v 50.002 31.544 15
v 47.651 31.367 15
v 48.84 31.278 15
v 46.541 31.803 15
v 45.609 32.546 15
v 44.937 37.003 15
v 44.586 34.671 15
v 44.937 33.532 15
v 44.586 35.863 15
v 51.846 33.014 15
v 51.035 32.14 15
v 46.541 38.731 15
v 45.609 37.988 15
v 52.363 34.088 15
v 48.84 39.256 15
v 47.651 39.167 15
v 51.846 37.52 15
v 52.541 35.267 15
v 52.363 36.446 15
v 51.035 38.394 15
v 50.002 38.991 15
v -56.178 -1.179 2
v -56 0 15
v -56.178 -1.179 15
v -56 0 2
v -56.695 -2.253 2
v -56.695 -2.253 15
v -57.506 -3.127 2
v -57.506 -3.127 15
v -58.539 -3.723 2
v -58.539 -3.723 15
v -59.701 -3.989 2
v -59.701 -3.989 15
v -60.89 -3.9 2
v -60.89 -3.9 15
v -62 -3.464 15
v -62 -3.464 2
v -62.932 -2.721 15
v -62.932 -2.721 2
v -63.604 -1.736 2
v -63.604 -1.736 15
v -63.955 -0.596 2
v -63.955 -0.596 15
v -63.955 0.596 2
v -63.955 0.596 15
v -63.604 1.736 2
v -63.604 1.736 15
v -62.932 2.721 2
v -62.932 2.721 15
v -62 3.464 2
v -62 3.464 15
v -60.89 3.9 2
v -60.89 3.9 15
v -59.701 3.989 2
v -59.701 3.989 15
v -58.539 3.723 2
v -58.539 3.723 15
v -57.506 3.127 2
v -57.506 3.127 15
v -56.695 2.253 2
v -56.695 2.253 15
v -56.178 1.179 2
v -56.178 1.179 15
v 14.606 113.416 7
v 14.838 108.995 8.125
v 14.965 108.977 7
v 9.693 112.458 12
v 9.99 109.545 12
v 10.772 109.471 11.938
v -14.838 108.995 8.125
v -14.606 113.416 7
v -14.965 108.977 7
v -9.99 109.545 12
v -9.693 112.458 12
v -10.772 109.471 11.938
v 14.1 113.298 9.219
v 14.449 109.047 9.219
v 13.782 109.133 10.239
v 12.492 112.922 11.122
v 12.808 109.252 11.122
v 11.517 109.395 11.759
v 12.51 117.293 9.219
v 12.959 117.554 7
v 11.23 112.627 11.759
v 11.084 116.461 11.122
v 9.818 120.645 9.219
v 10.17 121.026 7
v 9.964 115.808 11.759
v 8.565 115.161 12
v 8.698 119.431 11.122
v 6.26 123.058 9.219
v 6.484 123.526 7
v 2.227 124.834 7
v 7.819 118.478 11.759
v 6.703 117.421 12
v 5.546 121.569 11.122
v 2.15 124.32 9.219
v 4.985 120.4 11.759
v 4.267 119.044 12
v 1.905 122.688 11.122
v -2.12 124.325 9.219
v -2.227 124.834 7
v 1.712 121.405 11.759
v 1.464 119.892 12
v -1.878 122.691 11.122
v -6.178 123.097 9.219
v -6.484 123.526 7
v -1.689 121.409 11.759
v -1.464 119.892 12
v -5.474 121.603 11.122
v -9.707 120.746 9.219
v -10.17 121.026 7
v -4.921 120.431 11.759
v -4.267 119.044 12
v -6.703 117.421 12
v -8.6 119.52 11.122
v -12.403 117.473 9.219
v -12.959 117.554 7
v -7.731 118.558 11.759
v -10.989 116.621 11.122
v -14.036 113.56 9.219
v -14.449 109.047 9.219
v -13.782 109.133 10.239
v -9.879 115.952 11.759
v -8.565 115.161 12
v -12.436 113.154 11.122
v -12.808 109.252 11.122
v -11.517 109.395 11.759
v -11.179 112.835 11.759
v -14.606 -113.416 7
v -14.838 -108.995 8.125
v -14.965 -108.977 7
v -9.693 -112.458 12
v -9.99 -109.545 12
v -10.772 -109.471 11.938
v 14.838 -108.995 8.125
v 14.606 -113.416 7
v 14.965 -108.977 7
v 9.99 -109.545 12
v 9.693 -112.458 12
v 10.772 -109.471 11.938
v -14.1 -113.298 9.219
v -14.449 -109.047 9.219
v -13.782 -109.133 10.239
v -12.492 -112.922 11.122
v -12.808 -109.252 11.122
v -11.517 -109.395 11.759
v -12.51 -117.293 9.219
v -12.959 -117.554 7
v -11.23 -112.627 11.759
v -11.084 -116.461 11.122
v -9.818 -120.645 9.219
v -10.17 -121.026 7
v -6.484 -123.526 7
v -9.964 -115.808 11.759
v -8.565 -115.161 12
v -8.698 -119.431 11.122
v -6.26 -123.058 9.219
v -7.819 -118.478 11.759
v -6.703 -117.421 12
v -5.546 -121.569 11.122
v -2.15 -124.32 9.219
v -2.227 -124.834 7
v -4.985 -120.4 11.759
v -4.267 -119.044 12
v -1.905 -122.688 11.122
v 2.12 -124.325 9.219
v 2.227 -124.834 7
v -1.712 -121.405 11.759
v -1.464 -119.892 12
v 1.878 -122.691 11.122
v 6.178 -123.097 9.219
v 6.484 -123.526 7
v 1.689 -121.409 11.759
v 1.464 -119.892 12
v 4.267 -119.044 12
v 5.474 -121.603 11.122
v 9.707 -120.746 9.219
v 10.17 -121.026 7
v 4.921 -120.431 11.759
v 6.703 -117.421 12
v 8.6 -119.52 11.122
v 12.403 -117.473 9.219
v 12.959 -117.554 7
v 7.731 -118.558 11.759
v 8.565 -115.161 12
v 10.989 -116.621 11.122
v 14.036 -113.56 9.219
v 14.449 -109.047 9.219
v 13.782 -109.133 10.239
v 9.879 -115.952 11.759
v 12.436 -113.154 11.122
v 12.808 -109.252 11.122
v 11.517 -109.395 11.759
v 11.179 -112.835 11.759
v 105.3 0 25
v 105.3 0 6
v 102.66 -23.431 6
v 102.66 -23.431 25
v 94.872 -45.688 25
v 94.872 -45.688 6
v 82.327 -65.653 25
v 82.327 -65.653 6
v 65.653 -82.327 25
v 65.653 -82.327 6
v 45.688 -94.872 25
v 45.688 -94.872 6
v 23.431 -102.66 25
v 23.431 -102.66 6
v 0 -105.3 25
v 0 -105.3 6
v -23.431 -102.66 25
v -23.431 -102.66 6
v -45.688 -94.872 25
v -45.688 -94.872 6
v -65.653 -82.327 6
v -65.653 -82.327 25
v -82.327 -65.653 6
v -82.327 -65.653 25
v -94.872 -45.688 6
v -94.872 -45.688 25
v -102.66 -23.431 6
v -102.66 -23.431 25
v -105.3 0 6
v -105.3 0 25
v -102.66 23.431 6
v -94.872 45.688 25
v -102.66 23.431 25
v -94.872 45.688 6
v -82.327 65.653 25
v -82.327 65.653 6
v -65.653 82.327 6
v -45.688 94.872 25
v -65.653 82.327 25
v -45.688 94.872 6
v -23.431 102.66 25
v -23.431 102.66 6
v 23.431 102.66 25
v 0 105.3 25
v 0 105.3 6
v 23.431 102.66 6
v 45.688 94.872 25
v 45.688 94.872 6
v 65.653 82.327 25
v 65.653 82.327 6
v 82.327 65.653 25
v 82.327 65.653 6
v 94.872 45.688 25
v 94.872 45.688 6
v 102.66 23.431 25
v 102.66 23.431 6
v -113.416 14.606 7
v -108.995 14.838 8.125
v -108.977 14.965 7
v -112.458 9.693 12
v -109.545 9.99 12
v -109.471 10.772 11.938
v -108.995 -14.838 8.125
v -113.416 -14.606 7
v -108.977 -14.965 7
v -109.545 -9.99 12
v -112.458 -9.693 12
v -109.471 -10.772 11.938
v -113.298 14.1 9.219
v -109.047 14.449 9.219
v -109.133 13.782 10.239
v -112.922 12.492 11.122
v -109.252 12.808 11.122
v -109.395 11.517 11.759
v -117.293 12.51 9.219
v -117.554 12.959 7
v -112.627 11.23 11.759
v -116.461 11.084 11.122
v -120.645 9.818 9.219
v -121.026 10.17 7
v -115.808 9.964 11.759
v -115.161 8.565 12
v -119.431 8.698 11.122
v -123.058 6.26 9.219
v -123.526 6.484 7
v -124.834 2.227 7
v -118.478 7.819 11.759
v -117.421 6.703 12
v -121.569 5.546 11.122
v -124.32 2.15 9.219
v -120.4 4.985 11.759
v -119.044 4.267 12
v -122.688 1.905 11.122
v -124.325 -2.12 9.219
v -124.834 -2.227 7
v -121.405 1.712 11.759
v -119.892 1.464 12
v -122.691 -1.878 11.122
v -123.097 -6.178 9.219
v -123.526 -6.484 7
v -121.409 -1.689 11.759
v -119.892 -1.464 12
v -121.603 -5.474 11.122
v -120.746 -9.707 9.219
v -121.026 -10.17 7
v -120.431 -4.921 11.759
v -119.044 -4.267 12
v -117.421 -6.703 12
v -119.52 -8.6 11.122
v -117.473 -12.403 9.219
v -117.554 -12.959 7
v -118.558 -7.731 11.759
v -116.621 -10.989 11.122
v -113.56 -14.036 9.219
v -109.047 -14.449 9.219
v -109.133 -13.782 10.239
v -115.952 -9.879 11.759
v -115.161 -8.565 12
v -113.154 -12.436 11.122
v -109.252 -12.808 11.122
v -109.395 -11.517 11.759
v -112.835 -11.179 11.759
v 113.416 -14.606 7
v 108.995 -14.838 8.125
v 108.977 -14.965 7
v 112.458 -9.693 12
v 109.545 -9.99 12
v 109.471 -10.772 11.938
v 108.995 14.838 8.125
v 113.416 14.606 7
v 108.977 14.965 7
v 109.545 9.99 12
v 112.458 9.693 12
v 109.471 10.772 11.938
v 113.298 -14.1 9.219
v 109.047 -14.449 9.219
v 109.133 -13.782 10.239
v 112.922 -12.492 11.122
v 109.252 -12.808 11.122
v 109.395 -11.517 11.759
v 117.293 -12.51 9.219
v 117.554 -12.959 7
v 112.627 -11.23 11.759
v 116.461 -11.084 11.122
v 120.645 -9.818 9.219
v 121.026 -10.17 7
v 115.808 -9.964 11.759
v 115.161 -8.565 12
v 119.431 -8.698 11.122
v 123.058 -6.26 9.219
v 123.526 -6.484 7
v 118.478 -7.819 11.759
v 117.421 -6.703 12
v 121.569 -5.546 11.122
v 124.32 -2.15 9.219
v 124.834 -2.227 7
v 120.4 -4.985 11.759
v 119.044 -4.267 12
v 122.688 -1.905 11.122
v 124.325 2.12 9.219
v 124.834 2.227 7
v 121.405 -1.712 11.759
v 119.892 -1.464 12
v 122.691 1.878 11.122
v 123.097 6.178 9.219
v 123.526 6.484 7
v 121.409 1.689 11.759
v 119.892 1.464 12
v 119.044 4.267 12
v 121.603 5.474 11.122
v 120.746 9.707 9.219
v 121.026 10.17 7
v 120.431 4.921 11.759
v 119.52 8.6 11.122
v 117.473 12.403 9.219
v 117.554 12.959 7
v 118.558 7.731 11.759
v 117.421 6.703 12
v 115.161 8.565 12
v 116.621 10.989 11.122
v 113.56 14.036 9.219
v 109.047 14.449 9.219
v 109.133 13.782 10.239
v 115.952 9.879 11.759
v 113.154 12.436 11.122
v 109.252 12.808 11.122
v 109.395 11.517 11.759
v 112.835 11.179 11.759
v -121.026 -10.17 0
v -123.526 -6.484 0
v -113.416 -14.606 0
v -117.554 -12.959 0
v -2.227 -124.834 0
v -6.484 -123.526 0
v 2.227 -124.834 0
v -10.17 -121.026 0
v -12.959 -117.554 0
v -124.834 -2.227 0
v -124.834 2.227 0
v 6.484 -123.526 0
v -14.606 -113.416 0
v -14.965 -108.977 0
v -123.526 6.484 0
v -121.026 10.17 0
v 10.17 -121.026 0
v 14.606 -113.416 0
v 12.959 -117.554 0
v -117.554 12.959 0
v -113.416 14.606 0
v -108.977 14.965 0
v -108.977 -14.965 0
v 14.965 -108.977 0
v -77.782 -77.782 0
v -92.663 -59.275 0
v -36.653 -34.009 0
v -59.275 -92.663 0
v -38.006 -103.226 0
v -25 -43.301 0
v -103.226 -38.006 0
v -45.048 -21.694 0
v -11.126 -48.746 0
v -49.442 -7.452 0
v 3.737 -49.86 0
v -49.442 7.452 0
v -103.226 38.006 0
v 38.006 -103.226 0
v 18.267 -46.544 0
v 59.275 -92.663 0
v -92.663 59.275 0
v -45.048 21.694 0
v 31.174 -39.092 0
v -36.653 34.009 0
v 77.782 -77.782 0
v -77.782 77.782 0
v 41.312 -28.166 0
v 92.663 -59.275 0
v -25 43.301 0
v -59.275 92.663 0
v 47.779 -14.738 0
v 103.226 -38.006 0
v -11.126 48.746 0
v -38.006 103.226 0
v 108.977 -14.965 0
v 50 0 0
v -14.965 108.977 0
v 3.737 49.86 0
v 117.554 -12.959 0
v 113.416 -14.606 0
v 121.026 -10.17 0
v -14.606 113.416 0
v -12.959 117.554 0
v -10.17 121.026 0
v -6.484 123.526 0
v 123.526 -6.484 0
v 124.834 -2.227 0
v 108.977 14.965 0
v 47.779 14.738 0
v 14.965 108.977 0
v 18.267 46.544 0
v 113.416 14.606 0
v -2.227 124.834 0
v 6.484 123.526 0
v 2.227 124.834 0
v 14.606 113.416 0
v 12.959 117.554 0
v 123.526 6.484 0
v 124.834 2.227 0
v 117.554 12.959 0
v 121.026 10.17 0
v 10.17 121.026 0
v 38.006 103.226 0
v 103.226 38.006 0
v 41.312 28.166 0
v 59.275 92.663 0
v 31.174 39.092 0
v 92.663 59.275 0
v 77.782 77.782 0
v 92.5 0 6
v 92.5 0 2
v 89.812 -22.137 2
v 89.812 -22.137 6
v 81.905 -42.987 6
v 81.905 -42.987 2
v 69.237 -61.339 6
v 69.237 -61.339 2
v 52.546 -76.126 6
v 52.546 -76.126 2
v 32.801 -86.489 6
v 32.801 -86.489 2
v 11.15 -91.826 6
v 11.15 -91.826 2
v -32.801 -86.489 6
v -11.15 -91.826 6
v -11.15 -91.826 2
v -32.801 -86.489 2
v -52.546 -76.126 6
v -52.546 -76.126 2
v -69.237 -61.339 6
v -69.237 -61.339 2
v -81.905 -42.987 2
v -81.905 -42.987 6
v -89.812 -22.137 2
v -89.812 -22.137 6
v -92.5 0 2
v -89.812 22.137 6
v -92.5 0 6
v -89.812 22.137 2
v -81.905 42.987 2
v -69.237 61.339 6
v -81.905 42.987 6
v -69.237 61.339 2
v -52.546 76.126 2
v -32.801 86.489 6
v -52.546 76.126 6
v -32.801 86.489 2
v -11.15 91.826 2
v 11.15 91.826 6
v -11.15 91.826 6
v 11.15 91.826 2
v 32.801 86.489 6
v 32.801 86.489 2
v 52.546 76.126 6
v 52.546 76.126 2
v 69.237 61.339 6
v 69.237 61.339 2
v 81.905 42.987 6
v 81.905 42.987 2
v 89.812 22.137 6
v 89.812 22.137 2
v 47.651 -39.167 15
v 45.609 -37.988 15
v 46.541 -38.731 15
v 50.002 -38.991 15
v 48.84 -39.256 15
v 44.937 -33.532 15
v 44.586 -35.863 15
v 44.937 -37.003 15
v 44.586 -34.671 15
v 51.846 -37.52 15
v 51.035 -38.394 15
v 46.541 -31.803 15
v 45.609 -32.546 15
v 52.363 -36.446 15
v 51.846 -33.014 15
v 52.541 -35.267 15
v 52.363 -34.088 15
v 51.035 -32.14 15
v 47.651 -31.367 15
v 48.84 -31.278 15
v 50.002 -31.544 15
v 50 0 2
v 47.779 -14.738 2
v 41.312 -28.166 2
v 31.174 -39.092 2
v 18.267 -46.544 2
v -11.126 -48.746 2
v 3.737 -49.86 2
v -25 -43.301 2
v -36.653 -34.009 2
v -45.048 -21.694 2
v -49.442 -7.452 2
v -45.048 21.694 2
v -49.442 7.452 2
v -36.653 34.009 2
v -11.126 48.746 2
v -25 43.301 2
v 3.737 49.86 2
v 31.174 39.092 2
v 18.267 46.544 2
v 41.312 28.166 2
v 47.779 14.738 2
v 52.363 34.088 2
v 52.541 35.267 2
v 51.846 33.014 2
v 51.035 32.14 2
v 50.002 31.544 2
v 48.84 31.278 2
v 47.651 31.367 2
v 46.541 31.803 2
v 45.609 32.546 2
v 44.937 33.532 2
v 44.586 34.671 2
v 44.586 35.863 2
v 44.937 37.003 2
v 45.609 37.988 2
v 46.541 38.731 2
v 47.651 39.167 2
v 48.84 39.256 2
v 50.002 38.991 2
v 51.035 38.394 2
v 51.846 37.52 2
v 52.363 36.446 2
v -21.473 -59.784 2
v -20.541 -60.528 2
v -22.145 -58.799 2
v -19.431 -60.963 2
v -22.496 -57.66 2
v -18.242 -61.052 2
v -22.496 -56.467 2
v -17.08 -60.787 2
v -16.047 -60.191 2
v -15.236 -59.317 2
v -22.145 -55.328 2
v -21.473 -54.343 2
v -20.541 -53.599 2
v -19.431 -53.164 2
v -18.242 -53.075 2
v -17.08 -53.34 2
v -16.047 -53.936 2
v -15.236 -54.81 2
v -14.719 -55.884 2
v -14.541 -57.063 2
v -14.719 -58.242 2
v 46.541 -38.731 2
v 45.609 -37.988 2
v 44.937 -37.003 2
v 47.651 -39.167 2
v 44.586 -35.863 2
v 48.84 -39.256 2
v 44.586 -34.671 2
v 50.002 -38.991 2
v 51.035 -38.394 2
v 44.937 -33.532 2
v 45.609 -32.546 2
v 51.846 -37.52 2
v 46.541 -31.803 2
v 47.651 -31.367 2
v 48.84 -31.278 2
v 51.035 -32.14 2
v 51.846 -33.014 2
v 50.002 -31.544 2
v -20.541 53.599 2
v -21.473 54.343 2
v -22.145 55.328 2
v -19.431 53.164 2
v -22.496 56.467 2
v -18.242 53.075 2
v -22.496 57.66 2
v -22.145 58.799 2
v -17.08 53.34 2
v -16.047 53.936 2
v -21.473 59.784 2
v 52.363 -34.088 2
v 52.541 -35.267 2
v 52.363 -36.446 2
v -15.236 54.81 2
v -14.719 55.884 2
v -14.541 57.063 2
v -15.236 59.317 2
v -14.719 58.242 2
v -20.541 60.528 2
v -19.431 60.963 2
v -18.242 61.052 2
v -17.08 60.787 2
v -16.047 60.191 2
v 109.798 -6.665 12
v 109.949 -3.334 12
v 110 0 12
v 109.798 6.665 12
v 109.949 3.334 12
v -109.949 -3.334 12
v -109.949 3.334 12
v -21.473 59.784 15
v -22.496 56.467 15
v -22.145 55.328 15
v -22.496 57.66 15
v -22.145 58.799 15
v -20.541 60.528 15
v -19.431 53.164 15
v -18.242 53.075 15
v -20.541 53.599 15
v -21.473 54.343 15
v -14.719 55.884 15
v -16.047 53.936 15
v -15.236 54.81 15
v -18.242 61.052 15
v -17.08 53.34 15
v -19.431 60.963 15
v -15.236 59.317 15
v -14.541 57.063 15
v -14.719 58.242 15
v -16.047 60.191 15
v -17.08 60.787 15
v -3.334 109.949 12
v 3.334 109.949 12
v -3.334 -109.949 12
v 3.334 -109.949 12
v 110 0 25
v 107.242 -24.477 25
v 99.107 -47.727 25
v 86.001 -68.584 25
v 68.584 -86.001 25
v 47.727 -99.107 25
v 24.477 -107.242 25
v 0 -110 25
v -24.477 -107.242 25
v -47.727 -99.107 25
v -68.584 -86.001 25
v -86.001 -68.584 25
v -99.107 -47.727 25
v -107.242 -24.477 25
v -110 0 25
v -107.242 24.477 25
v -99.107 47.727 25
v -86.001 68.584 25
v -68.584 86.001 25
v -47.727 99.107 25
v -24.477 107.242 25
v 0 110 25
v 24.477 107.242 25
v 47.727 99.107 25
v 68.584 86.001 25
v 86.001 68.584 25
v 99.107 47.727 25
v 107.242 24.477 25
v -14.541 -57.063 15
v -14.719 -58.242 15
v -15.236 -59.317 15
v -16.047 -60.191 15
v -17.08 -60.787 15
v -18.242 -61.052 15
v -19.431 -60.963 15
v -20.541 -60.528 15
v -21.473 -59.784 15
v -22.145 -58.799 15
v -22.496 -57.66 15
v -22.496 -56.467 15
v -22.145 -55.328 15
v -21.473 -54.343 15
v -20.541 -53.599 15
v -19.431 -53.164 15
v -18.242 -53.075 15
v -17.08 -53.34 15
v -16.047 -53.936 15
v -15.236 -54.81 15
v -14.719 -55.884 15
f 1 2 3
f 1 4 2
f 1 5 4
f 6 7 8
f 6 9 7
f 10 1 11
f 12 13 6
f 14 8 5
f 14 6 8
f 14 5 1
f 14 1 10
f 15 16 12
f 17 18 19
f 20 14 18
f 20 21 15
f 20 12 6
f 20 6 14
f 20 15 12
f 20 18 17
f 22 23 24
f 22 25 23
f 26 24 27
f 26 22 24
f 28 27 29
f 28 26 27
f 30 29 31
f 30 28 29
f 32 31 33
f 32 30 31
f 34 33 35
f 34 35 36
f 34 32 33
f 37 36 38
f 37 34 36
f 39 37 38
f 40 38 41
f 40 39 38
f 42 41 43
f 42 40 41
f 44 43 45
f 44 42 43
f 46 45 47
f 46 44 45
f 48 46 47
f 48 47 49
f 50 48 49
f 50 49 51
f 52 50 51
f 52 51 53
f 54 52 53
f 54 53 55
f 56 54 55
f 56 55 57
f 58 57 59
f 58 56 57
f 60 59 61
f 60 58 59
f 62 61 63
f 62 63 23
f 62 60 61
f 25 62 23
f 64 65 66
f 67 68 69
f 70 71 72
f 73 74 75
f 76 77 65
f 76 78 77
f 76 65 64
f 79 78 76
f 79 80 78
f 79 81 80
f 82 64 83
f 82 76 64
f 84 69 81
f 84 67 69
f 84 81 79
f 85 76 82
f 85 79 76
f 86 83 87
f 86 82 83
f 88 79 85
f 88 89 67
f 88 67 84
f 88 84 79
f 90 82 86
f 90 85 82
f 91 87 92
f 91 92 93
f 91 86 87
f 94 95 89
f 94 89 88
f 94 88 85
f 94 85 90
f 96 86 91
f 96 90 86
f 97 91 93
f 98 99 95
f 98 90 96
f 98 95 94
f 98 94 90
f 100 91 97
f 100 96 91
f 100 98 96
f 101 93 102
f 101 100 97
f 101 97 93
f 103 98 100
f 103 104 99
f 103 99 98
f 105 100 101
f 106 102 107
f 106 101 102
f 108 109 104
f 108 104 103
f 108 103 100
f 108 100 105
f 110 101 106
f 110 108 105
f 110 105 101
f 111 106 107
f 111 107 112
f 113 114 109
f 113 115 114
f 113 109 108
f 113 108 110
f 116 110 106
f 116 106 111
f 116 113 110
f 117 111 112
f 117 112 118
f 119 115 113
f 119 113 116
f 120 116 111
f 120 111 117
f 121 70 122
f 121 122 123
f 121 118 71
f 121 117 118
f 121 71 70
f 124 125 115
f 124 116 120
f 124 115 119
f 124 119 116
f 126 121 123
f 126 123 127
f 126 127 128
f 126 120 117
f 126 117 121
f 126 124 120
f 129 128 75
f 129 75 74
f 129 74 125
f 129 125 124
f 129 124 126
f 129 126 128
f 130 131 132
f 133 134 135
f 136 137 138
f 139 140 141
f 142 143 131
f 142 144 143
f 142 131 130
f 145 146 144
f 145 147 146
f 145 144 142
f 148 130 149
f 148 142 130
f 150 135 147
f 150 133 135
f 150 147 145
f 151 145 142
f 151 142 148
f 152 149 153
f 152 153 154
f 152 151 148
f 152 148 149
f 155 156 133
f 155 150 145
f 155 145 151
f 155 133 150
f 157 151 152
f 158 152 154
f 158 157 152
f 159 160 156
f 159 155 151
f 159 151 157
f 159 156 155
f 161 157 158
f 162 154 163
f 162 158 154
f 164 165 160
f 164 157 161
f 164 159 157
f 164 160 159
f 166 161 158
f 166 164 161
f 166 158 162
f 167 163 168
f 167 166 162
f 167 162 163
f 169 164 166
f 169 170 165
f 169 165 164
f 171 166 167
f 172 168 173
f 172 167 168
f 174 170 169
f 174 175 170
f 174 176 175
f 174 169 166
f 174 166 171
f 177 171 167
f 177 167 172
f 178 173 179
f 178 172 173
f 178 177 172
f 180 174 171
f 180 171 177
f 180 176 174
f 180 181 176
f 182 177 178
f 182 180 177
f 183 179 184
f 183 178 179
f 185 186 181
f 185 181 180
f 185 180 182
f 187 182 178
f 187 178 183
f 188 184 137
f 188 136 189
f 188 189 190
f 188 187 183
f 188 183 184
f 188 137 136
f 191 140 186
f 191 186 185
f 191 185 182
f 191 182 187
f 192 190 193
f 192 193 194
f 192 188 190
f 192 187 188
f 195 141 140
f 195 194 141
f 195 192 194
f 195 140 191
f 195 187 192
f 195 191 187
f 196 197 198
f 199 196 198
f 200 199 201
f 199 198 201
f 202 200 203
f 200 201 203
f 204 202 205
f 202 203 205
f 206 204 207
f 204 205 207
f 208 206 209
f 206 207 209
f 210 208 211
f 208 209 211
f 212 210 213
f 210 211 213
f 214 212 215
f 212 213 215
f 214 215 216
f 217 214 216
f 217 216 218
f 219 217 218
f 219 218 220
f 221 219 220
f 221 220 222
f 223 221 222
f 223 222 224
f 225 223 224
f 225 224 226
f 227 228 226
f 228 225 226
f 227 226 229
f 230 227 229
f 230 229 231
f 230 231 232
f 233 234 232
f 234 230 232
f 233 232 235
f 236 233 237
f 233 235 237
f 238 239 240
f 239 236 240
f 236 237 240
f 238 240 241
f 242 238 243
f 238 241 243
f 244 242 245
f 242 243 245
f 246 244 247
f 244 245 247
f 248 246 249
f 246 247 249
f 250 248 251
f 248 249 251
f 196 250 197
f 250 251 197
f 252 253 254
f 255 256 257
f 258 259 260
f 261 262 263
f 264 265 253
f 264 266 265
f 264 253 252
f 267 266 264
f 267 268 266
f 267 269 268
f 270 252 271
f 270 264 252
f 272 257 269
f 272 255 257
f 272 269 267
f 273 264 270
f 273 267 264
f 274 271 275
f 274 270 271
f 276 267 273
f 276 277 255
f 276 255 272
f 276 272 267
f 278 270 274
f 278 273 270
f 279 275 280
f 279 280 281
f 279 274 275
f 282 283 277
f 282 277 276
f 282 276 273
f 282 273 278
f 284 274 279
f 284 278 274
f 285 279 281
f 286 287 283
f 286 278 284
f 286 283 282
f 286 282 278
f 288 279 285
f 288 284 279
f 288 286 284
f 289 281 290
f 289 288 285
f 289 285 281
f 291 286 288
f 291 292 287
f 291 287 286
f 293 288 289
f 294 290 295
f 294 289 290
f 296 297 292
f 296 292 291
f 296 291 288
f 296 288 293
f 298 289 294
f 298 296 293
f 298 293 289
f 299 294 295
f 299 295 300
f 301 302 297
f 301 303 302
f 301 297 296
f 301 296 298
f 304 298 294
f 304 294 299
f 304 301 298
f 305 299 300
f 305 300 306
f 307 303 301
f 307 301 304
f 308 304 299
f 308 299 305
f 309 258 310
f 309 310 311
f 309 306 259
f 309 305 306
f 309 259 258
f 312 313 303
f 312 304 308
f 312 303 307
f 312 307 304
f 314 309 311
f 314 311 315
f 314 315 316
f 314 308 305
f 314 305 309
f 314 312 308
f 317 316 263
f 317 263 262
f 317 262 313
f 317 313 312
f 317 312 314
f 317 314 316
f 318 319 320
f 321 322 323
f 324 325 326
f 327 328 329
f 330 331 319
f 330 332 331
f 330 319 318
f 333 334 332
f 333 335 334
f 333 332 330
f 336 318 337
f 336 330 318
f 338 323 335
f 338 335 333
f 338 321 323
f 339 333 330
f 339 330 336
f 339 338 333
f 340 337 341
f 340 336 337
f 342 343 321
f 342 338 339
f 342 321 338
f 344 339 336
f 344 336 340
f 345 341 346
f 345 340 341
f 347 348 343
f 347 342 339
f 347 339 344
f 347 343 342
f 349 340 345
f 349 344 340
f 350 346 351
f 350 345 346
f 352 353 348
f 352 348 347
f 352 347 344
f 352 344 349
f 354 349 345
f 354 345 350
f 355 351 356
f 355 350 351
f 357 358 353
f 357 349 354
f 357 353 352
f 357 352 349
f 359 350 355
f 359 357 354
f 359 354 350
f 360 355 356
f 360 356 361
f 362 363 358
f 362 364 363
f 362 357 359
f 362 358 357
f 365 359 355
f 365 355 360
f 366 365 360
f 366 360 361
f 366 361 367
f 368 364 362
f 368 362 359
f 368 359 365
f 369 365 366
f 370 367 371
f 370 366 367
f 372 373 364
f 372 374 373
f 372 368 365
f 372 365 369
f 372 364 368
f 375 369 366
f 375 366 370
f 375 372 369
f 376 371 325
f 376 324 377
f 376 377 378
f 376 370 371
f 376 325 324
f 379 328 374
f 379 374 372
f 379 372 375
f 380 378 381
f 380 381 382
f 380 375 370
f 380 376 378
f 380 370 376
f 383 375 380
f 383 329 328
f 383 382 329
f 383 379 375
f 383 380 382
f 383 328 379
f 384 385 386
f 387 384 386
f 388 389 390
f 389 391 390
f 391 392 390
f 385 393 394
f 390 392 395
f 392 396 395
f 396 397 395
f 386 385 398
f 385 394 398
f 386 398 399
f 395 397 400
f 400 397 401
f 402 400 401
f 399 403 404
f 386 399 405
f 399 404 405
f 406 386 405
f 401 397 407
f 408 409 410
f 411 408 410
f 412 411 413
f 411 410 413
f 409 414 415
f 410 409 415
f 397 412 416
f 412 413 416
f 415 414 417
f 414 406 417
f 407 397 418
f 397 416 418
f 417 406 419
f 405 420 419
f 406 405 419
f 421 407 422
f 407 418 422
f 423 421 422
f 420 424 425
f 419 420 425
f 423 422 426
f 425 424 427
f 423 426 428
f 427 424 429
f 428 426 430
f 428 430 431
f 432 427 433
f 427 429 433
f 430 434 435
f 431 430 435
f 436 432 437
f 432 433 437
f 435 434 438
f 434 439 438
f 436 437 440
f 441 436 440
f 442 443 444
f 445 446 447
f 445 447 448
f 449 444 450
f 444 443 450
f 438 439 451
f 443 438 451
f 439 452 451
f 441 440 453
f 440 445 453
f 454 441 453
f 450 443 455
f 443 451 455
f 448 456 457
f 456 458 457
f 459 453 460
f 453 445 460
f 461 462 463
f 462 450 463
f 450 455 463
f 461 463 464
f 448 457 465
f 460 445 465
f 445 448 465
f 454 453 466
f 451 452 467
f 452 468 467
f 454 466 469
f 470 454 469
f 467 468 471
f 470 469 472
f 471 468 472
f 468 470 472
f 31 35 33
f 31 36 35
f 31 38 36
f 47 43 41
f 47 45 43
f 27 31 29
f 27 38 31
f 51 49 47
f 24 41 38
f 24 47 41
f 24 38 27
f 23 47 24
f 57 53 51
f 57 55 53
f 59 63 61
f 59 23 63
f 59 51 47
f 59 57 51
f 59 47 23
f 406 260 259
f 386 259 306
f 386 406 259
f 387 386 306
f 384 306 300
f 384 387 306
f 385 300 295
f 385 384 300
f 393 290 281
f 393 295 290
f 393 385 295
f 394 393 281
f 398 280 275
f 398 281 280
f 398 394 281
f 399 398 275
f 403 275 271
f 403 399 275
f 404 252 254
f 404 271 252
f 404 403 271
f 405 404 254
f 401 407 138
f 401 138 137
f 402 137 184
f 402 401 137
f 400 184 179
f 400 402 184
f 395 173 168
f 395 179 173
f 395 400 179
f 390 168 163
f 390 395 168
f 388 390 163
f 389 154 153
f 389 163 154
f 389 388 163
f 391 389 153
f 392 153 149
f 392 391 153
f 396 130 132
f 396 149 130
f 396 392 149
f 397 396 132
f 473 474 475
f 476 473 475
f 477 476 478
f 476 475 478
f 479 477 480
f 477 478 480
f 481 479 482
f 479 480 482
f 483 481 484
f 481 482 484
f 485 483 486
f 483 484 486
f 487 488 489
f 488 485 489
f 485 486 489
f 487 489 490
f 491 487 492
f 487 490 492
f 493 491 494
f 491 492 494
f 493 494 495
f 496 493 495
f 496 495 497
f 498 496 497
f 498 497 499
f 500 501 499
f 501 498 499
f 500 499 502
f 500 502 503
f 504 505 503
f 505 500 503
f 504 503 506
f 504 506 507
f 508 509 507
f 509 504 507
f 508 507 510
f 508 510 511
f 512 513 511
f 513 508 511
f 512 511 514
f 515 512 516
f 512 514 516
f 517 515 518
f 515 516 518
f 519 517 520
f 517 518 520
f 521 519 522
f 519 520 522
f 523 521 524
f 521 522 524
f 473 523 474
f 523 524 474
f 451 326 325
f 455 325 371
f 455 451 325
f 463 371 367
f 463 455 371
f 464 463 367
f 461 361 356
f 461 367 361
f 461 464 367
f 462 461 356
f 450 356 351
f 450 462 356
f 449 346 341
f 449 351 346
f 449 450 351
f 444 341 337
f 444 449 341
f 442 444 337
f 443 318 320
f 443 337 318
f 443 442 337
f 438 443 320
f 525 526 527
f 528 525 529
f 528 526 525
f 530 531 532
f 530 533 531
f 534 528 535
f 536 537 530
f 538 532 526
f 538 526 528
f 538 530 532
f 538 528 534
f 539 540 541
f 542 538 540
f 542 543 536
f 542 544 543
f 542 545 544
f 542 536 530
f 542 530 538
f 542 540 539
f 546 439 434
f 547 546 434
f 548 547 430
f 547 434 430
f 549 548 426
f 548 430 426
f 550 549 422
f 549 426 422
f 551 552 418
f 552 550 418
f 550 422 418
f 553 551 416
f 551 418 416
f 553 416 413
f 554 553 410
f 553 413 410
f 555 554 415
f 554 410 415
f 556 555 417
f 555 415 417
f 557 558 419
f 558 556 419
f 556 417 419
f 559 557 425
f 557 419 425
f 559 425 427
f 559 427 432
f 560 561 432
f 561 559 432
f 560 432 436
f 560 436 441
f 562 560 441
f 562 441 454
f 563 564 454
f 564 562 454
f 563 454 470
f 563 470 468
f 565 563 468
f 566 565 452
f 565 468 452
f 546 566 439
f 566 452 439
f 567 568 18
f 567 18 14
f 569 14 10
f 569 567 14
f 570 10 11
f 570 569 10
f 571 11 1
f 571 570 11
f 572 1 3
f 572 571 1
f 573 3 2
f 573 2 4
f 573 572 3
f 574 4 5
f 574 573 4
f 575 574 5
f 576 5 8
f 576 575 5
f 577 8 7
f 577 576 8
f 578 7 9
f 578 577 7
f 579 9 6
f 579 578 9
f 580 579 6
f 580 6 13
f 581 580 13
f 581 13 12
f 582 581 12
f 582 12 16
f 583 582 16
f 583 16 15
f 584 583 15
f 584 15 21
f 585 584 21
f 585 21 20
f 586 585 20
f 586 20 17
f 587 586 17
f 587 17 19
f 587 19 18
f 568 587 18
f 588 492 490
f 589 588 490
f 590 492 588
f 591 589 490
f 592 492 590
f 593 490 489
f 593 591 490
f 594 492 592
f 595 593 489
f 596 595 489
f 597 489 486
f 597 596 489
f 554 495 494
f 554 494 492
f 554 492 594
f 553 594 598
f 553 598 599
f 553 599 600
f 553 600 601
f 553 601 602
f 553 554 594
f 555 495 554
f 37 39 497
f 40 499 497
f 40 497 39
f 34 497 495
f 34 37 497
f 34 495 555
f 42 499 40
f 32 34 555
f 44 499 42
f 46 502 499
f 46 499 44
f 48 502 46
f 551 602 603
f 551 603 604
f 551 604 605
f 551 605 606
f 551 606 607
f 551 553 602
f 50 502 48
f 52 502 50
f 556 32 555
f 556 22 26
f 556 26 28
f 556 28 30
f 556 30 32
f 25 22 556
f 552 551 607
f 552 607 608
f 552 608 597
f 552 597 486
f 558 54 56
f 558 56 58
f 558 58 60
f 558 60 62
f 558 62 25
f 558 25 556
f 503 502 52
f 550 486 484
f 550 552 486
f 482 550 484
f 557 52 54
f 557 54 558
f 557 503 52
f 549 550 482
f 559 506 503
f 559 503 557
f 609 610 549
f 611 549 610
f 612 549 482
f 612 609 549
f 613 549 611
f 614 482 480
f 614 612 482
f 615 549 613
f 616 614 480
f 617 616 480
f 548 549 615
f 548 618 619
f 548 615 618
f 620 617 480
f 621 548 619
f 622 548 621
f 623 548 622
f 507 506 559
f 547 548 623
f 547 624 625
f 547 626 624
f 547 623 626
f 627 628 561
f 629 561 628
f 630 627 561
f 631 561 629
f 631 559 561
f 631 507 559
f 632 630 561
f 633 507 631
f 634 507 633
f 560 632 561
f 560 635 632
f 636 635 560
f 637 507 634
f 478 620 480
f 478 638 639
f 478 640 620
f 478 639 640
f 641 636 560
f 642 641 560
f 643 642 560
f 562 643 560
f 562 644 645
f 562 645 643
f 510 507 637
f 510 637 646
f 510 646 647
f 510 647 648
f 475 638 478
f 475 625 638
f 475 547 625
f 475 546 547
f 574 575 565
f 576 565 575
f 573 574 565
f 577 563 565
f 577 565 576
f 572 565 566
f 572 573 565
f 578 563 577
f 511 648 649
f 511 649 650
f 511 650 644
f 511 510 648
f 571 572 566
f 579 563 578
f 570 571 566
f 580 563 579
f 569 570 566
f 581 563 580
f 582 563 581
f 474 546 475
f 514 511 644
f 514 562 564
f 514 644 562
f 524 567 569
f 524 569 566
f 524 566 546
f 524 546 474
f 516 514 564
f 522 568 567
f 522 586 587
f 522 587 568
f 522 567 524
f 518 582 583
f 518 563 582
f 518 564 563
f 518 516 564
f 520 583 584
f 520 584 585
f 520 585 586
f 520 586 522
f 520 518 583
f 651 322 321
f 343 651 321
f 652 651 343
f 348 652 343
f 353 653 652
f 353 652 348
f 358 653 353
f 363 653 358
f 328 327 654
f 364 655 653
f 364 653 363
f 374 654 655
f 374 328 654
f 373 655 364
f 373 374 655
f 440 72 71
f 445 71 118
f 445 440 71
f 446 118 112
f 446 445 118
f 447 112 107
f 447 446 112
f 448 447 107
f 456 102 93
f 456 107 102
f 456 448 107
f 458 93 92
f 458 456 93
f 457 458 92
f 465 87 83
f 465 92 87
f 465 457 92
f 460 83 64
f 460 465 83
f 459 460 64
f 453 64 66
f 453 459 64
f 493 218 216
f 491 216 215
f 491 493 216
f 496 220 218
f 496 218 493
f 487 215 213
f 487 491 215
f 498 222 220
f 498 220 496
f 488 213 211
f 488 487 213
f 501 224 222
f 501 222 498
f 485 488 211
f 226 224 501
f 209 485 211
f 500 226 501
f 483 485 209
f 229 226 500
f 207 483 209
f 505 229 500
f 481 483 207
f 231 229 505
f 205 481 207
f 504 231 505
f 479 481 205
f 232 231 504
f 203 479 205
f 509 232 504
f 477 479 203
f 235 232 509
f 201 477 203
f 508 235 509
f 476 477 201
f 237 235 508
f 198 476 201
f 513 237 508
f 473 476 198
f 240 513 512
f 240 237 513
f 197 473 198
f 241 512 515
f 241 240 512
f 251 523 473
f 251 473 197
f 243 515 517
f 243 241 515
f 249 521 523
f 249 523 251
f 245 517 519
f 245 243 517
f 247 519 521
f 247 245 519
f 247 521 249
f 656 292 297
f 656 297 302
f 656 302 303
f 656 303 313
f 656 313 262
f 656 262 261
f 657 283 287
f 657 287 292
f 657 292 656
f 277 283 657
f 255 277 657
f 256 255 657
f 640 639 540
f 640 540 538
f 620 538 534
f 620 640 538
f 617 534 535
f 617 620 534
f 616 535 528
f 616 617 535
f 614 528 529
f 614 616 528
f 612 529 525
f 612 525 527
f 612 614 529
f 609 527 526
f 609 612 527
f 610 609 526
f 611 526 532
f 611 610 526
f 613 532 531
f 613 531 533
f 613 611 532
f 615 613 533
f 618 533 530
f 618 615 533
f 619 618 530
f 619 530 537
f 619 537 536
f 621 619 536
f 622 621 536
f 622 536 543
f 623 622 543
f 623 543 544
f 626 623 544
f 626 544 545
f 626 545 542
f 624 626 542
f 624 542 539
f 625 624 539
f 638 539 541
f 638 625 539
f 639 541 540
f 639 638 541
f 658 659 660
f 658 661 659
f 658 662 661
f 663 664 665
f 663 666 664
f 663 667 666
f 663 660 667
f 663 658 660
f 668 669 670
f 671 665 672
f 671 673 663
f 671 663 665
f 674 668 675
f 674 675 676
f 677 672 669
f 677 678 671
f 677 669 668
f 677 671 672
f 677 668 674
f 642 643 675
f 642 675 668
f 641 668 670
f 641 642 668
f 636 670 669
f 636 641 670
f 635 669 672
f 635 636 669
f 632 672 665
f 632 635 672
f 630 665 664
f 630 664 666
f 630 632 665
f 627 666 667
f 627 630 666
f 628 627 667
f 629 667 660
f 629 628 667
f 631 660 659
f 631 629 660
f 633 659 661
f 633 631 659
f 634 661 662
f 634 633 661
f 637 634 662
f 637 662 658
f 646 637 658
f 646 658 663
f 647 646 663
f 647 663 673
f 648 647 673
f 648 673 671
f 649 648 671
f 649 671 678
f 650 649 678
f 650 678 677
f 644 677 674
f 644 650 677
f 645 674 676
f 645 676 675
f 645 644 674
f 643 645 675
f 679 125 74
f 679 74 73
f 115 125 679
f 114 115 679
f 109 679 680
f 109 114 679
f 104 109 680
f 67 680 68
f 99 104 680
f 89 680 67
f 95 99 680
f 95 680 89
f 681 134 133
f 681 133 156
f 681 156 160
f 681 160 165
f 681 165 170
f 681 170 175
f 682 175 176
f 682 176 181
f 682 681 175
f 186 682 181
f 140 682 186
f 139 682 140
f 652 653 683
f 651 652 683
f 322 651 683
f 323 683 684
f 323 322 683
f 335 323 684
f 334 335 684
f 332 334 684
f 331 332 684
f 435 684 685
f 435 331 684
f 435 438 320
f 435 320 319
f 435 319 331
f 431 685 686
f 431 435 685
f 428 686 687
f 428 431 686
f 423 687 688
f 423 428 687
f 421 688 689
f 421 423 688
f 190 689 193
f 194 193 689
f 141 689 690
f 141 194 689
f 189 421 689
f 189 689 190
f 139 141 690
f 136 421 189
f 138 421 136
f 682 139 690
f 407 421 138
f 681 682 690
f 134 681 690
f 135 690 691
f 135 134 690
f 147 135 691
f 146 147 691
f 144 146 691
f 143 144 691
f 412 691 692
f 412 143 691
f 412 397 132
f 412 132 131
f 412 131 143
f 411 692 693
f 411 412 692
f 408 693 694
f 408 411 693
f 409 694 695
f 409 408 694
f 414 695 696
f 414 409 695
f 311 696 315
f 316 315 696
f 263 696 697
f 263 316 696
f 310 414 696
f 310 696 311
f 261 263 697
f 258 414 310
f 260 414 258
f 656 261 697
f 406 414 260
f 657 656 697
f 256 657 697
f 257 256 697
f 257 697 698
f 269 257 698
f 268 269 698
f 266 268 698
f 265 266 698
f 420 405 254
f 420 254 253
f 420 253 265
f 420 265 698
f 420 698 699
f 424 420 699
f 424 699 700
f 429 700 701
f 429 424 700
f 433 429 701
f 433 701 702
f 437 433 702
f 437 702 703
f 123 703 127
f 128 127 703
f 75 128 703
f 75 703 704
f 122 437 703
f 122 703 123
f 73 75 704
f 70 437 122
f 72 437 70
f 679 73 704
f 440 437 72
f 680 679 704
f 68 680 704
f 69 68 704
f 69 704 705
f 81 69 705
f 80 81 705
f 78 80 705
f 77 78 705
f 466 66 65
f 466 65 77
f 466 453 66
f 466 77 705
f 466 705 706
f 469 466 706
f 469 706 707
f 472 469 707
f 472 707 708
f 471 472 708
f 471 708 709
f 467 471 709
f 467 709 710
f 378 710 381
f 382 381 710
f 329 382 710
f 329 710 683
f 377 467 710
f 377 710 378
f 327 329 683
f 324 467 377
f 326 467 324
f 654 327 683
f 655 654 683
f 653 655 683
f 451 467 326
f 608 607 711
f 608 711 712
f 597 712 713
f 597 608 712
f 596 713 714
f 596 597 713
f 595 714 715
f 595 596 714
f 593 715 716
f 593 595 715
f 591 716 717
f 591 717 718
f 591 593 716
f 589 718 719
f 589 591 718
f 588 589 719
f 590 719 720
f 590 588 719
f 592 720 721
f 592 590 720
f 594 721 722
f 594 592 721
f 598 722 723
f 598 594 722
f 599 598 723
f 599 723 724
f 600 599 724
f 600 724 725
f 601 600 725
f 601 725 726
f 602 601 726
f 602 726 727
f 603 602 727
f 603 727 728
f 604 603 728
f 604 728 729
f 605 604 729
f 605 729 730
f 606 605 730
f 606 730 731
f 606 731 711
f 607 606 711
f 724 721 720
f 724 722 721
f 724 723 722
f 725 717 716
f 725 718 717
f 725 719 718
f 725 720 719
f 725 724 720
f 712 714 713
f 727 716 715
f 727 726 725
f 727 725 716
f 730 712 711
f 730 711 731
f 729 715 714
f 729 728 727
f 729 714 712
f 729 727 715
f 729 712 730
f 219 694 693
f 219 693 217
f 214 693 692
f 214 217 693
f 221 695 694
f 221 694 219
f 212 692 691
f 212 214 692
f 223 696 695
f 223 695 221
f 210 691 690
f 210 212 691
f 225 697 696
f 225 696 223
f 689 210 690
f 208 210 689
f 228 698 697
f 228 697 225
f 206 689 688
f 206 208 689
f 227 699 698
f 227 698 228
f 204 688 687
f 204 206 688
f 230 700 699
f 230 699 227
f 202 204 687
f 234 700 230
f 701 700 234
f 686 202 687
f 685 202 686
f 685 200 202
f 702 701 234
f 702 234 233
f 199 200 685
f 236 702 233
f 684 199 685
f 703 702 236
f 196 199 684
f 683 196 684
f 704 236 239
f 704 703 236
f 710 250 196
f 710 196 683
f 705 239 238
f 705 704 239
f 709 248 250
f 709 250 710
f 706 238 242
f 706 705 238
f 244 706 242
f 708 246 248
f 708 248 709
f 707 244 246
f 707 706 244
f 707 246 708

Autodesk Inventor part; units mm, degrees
ref_plane "YZ Plane" through (0, 0, 0) normal (1, 0, 0) x (0, 1, 0)
ref_plane "XZ Plane" through (0, 0, 0) normal (0, 1, 0) x (-1, 0, 0)
ref_plane "XY Plane" through (0, 0, 0) normal (0, 0, 1) x (1, 0, 0)
sketch "Sketch1" plane through (0, 0, 0) normal (0, 0, 1) x (1, 0, 0)
  circle A0 centre (0, 0) radius 50
  circle A1 centre (0, 0) radius 60
  circle A2 centre (0, 0) radius 70
  circle A3 centre (-60, 0) radius 4
  circle A4 centre (-18.541, -57.0634) radius 4
  circle A5 centre (48.541, -35.2671) radius 4
  circle A6 centre (48.541, 35.2671) radius 4
  circle A7 centre (-18.541, 57.0634) radius 4
  circle A8 centre (0, 0) radius 105.3
  circle A9 centre (0, 0) radius 92.5
  circle A10 centre (0, 0) radius 99.25 construction
  line L0 (0, 0) -> (-99.25, 0) construction
  circle A11 centre (0, 0) radius 110
  circle A12 centre (-110, 0) radius 15
  circle A13 centre (0, -110) radius 15
  circle A14 centre (110, 0) radius 15
  circle A15 centre (0, 110) radius 15
  point P0 (-14.9651, -108.9773)
  point P1 (14.9651, -108.9773)
  point P2 (108.9773, -14.9651)
  point P3 (108.9773, 14.9651)
  point P4 (-14.9651, 108.9773)
  point P5 (14.9651, 108.9773)
  point P6 (-108.9773, -14.9651)
  point P7 (-108.9773, 14.9651)
  dimension "d1" = 120
  dimension "d14" = 198.5
  dimension "d22" = 220
  dimension "d0" = 100
  dimension "d2" = 140
  dimension "d3" = 8
  dimension "d6" = 360
  dimension "d12" = 210.6
  dimension "d13" = 185
  dimension "d25" = 30
  dimension "d28" = 360
extrude "Extrusion1" add sketch "Sketch1" along normal blind 2 contours A1 A5 A4 A3 A7 A6 | A2 | A9
extrude "Extrusion2" add sketch "Sketch1" along normal blind 15 contours A6 A1 | A1 A6 | A5 A1 | A1 A5 | A7 A1 | A1 A7 | A4 A1 | A1 A4 | A3 A1 | A1 A3
extrude "Extrusion3" add sketch "Sketch1" along normal blind 6 contours A8 A14 | A14 A8 A13 A12 A15 | A15 A8 | A8 A13 | A12 A8
extrude "Extrusion4" add sketch "Sketch1" along normal blind 12 contours A8 A14 A11 | A8 A15 A11 A14 | A14 A11 A13 A8 | A8 A15 A11 | A14 A11 | A13 A11 A8 | A8 A12 A11 A15 | A11 A15 | A13 A11 A12 A8 | A13 A11 | A8 A12 A11 | A11 A12
fillet "Fillet1" radius 5 4 edges at (-125, 0, 12) (0, -125, 12) (125, 0, 12) (0, 125, 12)
extrude "Extrusion5" add sketch "Sketch1" along normal blind 25 contours A8 A14 A11 | A8 A15 A11 A14 | A14 A11 A13 A8 | A8 A15 A11 | A13 A11 A8 | A8 A12 A11 A15 | A13 A11 A12 A8 | A8 A12 A11
properties part number "GroundPlate_Aperatus"
